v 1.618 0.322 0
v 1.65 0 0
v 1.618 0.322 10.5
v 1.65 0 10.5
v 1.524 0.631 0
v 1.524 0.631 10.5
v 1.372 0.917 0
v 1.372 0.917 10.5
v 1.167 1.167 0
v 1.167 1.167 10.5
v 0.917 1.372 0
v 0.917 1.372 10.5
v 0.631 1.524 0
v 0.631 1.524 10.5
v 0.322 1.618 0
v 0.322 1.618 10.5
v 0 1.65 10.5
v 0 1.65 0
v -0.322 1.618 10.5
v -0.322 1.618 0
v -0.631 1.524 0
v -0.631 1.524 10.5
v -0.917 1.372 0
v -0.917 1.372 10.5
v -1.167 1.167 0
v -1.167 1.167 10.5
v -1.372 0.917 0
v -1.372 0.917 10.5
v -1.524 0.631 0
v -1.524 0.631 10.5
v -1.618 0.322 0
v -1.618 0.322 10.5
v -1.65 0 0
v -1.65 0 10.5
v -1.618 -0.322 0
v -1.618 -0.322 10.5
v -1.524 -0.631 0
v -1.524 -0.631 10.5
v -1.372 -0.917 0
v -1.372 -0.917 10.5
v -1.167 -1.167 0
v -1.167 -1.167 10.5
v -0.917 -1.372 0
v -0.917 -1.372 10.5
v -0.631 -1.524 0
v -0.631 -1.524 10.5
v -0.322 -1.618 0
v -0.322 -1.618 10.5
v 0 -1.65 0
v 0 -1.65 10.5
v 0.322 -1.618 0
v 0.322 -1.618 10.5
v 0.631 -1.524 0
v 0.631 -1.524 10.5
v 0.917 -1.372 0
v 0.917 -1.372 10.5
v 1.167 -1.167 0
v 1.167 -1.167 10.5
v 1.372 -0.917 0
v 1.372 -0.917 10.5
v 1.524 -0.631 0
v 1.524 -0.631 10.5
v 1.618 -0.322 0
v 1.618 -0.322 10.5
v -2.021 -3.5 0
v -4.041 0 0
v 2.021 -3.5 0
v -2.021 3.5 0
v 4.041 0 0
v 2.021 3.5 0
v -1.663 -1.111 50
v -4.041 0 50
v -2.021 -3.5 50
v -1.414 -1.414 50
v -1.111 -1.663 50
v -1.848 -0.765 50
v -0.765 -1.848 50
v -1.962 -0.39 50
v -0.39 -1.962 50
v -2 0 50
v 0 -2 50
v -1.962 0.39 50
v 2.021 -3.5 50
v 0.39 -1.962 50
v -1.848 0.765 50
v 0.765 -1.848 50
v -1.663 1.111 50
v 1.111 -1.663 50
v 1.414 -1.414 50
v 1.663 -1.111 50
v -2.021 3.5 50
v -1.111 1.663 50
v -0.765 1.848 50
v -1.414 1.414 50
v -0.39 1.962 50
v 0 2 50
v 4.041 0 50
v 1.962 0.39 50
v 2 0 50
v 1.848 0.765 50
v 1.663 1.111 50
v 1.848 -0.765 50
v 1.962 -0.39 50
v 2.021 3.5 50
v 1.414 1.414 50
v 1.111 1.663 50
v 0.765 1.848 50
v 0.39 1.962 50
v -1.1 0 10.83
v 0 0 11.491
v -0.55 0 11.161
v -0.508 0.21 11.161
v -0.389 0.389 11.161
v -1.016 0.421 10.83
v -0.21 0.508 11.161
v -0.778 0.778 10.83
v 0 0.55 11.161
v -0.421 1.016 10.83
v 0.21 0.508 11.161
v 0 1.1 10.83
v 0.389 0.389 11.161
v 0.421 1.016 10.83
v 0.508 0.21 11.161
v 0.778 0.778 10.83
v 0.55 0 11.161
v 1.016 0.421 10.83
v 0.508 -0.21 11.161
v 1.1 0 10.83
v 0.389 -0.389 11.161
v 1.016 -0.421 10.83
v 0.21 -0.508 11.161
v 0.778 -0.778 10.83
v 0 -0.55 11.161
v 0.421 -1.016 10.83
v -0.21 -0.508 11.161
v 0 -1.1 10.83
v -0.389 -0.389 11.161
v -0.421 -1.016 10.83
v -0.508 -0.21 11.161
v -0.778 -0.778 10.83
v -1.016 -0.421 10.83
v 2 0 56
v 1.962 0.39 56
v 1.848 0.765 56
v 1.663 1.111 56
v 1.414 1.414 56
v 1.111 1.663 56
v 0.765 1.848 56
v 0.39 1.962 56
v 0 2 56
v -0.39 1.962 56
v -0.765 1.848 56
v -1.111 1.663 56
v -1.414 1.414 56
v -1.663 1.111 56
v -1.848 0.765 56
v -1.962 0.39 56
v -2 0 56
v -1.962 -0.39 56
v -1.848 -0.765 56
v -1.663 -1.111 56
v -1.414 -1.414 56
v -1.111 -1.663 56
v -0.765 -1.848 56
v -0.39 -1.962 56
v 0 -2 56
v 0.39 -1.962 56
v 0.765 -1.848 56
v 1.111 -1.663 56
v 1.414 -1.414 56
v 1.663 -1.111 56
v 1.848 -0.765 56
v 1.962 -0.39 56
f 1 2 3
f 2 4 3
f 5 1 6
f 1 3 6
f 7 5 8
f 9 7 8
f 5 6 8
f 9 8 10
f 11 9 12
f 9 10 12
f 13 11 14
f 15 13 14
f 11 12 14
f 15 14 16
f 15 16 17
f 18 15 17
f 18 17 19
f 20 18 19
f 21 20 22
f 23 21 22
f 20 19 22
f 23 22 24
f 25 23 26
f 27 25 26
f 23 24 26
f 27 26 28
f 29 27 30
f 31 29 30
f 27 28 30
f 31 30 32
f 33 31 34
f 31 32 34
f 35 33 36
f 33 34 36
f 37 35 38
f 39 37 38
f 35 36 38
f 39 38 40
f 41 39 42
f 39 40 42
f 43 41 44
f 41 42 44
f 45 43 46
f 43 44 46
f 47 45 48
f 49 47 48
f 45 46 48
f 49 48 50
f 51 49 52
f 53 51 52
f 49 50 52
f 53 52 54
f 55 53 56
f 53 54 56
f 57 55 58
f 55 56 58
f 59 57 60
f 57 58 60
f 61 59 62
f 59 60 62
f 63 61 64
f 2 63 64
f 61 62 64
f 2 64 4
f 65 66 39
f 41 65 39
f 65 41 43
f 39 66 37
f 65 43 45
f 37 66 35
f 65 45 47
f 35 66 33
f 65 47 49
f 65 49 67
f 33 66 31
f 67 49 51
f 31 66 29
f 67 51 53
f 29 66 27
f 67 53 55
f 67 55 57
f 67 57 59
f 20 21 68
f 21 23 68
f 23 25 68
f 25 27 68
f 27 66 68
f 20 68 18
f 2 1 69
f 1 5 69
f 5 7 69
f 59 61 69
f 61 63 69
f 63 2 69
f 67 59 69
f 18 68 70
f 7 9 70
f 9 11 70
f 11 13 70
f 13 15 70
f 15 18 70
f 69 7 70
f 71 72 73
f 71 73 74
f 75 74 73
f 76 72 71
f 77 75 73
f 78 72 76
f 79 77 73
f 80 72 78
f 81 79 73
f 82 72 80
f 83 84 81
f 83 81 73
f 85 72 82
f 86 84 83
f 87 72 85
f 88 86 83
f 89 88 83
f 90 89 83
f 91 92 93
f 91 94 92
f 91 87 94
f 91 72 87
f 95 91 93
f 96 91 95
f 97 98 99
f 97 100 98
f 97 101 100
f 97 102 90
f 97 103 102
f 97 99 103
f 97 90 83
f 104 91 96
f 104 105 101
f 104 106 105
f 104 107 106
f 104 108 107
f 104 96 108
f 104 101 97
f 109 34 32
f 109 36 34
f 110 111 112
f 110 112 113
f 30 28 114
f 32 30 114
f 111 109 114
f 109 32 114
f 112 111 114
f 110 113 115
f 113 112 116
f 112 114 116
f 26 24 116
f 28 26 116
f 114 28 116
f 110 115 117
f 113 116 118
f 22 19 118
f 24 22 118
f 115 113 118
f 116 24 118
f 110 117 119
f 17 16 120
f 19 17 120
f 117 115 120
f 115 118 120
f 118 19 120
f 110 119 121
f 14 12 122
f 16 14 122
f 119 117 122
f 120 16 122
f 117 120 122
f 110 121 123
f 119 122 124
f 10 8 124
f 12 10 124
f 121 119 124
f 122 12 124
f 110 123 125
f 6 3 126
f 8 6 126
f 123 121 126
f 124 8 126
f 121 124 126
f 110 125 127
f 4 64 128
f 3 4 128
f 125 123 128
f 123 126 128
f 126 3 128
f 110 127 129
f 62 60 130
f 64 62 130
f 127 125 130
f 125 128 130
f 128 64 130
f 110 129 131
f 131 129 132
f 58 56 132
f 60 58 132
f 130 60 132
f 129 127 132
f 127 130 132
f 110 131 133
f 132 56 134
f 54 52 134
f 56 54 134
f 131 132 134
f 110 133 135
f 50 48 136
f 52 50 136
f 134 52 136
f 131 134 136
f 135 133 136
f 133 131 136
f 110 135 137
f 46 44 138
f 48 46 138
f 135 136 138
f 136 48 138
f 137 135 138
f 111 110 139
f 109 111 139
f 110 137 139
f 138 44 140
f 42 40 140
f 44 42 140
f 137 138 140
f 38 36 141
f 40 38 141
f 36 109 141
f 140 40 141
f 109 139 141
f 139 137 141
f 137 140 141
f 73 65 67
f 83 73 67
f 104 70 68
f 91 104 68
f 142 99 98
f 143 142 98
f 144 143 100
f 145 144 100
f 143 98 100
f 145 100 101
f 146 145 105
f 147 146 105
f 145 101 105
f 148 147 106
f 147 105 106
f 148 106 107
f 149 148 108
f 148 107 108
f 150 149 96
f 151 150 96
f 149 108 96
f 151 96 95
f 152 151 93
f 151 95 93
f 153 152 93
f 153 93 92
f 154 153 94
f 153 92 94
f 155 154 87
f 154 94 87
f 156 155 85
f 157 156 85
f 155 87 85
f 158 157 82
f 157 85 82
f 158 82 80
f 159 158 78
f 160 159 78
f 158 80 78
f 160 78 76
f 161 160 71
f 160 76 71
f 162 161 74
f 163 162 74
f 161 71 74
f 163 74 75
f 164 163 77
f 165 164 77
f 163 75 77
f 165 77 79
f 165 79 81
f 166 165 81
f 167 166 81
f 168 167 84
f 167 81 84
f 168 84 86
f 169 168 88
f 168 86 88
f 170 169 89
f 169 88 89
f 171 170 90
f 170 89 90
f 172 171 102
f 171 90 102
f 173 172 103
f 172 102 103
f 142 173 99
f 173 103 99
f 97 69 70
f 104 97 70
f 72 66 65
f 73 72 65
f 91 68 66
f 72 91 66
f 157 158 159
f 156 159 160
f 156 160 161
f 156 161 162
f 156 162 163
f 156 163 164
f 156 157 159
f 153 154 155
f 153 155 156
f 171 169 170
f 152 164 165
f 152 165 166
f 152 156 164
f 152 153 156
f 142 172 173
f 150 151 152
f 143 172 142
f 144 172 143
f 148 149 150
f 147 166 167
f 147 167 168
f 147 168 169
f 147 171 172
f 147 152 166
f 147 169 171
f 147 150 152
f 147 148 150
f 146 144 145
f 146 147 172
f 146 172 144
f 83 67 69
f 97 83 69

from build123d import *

# Parameters (mm, degrees)
EXTRUDE_1_DEPTH = 50
SKETCH_2_R      = 2
EXTRUDE_2_DEPTH = 6
M4X0_7_1_D      = 3.3
M4X0_7_1_DEPTH  = 10.5
M4X0_7_1_TIP    = 0.991420021


with BuildPart() as part:
    # 草圖1 → 填料-伸長1 (new body)
    with BuildSketch(Plane.XY):
        Polygon((4.041451884, 0), (2.020725942, 3.5), (-2.020725942, 3.5), (-4.041451884, 0), (-2.020725942, -3.5), (2.020725942, -3.5), align=None)
    extrude(amount=EXTRUDE_1_DEPTH)

    # 草圖2 → 填料-伸長2 (add)
    with BuildSketch(Plane.XY.offset(50)):
        Circle(SKETCH_2_R)
    extrude(amount=EXTRUDE_2_DEPTH)

    # M4x0.7 螺紋孔1
    with Locations(Plane(origin=(0, 0, 0), x_dir=(-1, 0, 0), z_dir=(0, 0, -1))):
        with Locations((0, 0)):
            Hole(M4X0_7_1_D / 2, depth=M4X0_7_1_DEPTH)
            with Locations((0, 0, -(M4X0_7_1_DEPTH + M4X0_7_1_TIP / 2))):  # 118° drill point
                Cone(0, M4X0_7_1_D / 2, M4X0_7_1_TIP, mode=Mode.SUBTRACT)


solid = part.part
